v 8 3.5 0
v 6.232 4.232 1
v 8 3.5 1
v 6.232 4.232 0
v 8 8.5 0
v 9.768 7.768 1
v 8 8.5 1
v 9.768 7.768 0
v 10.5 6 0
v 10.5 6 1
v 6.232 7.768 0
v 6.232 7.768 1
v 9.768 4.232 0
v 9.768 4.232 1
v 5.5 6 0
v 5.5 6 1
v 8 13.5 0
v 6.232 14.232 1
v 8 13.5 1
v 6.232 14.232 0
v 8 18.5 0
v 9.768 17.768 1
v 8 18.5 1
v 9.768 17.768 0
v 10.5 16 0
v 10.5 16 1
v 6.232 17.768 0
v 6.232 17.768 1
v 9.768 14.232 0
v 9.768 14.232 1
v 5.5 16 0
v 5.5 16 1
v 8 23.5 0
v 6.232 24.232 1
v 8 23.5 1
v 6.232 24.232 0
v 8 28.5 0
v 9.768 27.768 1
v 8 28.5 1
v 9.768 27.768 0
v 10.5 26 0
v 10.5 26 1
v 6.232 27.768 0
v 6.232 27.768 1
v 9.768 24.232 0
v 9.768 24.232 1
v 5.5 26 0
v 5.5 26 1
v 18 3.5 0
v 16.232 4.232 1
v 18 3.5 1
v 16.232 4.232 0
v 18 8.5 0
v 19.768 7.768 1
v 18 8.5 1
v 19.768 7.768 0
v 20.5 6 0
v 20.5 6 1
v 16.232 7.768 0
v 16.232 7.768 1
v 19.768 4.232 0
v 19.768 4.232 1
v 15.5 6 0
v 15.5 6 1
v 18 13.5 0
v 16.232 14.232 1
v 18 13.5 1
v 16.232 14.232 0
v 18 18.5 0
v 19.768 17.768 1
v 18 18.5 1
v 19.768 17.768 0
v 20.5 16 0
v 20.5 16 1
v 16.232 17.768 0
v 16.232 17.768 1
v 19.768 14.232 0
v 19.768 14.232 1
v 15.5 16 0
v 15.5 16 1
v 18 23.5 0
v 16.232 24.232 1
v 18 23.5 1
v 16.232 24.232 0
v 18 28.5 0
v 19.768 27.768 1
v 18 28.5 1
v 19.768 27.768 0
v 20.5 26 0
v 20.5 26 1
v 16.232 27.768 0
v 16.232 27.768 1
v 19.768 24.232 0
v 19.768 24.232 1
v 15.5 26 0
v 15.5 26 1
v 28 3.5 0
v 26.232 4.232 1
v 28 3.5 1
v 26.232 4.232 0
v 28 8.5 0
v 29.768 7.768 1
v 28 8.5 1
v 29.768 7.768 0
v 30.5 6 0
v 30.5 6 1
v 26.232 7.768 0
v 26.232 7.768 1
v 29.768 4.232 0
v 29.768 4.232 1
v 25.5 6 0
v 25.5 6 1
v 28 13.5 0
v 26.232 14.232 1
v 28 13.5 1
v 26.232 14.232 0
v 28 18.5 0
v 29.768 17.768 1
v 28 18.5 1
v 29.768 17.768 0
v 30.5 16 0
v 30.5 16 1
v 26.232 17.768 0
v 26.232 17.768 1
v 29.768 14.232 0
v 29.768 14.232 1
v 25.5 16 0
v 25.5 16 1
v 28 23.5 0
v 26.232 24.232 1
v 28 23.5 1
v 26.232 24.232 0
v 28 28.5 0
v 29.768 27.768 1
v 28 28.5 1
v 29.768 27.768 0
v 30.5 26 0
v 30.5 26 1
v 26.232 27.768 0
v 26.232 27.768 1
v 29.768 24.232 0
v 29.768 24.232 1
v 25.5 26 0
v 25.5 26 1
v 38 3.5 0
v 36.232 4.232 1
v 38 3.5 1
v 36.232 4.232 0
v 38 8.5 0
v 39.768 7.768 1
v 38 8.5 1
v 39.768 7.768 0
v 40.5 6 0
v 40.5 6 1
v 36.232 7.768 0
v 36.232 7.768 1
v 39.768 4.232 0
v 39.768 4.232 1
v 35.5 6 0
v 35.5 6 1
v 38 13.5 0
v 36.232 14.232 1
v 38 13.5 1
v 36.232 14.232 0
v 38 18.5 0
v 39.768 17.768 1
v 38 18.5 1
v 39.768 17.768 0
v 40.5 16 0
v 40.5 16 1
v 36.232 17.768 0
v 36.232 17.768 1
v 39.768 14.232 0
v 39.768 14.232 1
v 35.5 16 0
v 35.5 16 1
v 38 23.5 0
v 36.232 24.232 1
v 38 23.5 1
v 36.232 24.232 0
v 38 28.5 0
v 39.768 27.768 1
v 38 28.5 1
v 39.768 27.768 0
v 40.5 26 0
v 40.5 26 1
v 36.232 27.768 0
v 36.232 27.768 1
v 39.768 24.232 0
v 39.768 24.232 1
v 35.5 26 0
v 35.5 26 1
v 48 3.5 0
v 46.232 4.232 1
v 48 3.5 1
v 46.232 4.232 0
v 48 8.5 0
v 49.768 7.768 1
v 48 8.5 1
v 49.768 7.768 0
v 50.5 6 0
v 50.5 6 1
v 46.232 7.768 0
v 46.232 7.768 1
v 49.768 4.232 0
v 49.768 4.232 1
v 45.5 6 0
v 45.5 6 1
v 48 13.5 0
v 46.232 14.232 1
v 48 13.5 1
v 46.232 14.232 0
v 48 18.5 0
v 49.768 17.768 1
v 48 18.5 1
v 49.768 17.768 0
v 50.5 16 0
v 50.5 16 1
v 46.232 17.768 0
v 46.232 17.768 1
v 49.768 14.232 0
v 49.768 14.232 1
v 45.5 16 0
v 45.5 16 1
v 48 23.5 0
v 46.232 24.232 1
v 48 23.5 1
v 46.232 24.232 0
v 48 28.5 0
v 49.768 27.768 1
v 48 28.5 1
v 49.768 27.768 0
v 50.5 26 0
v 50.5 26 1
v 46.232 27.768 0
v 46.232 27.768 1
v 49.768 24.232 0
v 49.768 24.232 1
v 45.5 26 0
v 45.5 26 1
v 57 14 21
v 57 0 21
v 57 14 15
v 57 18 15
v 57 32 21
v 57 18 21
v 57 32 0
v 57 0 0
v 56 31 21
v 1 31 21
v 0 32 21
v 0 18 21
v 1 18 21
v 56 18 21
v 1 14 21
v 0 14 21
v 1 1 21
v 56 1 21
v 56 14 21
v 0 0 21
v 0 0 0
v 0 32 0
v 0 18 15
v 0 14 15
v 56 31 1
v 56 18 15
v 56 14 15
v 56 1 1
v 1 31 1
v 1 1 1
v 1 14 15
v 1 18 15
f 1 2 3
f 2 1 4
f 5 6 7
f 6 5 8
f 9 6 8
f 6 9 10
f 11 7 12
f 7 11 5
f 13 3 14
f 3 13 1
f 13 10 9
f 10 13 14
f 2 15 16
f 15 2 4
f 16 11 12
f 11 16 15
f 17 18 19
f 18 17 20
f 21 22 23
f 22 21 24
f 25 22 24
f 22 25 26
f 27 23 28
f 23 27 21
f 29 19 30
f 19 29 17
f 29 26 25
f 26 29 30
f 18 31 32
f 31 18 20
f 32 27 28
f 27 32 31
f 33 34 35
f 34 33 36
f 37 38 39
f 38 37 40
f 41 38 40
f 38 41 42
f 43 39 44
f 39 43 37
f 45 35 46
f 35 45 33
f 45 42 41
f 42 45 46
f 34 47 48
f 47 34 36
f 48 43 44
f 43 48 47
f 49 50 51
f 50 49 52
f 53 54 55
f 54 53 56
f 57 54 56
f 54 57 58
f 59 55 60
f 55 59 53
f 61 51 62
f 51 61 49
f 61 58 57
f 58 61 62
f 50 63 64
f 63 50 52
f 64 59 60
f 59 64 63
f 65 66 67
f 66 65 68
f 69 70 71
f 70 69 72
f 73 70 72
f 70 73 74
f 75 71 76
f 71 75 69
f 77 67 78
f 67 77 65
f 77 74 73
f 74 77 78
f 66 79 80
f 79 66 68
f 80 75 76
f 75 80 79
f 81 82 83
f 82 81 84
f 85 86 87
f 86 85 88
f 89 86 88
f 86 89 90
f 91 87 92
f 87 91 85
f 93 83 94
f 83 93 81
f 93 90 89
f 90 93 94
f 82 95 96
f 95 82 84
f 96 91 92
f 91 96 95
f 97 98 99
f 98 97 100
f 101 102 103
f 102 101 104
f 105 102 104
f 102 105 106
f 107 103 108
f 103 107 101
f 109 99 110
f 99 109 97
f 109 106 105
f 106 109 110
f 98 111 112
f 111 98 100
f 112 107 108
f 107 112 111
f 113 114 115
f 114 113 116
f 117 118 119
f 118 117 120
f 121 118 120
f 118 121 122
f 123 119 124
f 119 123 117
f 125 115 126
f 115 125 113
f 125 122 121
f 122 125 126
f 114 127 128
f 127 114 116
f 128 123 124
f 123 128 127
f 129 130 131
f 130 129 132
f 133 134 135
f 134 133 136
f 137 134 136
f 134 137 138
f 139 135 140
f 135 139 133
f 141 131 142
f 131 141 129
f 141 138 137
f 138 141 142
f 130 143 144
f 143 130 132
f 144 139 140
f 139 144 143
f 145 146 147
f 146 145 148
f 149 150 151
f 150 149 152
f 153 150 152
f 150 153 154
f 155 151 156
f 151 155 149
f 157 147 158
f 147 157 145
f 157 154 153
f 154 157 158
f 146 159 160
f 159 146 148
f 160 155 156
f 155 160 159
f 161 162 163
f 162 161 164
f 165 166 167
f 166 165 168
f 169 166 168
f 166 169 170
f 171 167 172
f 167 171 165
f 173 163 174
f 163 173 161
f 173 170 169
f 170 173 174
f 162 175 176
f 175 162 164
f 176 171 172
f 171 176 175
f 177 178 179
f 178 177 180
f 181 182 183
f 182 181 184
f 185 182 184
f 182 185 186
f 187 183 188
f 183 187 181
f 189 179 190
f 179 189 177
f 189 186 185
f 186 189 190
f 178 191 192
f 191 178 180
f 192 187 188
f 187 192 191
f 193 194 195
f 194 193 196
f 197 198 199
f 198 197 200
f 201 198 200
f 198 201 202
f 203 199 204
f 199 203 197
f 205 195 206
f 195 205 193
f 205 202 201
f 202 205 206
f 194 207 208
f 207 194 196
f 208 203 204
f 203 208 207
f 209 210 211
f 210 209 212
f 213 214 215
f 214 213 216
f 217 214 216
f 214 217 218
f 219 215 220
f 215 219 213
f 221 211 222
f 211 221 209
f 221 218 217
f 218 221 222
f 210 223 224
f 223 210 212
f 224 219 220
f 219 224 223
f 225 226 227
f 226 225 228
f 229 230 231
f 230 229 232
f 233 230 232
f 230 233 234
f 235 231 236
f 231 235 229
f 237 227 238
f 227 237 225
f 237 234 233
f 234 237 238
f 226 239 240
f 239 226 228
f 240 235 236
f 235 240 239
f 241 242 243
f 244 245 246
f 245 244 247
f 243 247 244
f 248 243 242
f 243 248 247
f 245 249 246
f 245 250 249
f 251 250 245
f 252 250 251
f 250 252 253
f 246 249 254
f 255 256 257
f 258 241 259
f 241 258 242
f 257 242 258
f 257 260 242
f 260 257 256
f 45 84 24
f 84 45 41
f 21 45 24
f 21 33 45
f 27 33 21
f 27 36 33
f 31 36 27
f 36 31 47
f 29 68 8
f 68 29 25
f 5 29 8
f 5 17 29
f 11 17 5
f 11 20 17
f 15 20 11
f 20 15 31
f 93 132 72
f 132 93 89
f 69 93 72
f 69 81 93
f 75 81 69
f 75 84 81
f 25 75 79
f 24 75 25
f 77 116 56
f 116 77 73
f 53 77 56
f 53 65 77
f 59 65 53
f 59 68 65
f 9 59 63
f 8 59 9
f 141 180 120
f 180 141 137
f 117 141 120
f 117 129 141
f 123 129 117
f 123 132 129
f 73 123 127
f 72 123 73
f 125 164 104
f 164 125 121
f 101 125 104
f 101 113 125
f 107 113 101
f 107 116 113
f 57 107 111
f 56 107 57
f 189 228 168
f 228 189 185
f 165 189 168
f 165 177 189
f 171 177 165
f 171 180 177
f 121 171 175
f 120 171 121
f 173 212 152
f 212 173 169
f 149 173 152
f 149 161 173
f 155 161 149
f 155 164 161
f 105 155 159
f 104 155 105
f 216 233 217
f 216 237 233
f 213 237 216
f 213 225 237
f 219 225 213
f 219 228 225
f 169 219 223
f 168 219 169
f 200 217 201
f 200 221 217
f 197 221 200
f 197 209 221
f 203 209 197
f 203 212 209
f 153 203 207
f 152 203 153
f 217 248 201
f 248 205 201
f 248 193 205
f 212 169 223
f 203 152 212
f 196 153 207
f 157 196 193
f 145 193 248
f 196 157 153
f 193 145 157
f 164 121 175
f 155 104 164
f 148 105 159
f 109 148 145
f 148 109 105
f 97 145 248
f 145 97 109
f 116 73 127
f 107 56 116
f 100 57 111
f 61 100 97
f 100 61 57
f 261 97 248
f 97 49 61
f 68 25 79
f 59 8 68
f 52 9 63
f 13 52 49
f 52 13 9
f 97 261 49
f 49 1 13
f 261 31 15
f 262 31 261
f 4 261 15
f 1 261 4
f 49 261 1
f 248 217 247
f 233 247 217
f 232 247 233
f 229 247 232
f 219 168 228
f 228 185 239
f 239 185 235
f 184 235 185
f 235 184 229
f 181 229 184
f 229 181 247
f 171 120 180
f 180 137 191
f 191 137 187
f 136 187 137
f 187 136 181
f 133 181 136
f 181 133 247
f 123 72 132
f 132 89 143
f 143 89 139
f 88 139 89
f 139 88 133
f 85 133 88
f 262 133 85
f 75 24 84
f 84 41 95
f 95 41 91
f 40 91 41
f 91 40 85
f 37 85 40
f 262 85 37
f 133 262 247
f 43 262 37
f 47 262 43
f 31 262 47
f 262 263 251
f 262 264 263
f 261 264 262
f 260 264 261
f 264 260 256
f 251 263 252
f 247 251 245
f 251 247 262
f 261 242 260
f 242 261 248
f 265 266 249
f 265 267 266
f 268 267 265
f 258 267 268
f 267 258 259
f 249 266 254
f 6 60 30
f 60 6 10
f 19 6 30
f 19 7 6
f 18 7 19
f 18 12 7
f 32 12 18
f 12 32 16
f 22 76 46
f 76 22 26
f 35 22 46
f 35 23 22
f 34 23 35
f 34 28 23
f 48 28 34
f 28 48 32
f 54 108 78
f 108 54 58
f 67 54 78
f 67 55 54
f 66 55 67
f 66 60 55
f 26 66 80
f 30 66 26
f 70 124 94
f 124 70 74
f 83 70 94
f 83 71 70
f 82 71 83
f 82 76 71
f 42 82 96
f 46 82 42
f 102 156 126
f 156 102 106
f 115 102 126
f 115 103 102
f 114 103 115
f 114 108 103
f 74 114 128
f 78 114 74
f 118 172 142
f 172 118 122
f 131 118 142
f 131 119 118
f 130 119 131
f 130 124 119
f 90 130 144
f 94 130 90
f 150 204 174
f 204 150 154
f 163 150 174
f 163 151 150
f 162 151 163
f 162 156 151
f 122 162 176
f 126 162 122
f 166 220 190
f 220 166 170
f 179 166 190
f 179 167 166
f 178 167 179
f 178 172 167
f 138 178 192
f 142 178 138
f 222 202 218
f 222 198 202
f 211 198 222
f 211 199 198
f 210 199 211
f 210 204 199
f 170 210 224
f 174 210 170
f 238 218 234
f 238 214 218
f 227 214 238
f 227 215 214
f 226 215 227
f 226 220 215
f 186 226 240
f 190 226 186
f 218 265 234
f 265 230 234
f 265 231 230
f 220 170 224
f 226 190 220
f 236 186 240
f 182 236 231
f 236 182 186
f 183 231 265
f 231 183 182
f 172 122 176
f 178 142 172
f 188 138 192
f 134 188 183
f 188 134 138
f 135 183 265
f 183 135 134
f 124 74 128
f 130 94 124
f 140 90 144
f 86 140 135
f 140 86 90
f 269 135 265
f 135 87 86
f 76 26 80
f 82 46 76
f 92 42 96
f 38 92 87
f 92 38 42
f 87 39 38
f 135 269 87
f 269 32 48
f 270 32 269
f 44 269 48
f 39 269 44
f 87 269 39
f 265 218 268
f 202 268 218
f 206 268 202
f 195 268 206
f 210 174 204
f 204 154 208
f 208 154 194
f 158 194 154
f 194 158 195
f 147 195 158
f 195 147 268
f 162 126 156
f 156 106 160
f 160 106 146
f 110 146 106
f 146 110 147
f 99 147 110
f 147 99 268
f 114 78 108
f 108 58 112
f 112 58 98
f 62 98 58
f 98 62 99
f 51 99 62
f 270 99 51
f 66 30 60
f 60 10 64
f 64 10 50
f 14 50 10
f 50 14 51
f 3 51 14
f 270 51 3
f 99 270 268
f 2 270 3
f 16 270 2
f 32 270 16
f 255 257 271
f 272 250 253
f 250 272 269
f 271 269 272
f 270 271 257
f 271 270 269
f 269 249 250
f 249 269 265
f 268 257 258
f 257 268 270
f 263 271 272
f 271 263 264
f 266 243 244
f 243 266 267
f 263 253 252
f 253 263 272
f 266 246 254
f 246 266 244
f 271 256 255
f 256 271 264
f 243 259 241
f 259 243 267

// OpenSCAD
// file: detail/config.scad
eps = 0.01;
int_size = [55, 30, 20];
wall = 1;
ext_size = int_size + wall * [2,2,2];
// main file
include <detail/config.scad>

module bottom()
{
  difference()
  {
    cube(ext_size - [0,0,wall]);
    // inner cut
    translate(wall*[1,1,1])
      cube(int_size + [0,0,eps]);
    // ventilation holes
    {
      d = 5;
      for(ix=[0:2*d:int_size[0]-2*d])
        for(iy=[0:2*d:int_size[1]-d])
          translate((wall+d)*[1,1,0] + [2,0,0] + [ix, iy, -eps])
            cylinder(d=d, h=3*wall);
    }
    // cable holes
    {
      h = wall*2+5;
      translate([-eps, ext_size[1]/2-4/2, ext_size[2]-h])
        cube([ext_size[0]+2*eps, 4, h]);
    }
  }
}

bottom();
